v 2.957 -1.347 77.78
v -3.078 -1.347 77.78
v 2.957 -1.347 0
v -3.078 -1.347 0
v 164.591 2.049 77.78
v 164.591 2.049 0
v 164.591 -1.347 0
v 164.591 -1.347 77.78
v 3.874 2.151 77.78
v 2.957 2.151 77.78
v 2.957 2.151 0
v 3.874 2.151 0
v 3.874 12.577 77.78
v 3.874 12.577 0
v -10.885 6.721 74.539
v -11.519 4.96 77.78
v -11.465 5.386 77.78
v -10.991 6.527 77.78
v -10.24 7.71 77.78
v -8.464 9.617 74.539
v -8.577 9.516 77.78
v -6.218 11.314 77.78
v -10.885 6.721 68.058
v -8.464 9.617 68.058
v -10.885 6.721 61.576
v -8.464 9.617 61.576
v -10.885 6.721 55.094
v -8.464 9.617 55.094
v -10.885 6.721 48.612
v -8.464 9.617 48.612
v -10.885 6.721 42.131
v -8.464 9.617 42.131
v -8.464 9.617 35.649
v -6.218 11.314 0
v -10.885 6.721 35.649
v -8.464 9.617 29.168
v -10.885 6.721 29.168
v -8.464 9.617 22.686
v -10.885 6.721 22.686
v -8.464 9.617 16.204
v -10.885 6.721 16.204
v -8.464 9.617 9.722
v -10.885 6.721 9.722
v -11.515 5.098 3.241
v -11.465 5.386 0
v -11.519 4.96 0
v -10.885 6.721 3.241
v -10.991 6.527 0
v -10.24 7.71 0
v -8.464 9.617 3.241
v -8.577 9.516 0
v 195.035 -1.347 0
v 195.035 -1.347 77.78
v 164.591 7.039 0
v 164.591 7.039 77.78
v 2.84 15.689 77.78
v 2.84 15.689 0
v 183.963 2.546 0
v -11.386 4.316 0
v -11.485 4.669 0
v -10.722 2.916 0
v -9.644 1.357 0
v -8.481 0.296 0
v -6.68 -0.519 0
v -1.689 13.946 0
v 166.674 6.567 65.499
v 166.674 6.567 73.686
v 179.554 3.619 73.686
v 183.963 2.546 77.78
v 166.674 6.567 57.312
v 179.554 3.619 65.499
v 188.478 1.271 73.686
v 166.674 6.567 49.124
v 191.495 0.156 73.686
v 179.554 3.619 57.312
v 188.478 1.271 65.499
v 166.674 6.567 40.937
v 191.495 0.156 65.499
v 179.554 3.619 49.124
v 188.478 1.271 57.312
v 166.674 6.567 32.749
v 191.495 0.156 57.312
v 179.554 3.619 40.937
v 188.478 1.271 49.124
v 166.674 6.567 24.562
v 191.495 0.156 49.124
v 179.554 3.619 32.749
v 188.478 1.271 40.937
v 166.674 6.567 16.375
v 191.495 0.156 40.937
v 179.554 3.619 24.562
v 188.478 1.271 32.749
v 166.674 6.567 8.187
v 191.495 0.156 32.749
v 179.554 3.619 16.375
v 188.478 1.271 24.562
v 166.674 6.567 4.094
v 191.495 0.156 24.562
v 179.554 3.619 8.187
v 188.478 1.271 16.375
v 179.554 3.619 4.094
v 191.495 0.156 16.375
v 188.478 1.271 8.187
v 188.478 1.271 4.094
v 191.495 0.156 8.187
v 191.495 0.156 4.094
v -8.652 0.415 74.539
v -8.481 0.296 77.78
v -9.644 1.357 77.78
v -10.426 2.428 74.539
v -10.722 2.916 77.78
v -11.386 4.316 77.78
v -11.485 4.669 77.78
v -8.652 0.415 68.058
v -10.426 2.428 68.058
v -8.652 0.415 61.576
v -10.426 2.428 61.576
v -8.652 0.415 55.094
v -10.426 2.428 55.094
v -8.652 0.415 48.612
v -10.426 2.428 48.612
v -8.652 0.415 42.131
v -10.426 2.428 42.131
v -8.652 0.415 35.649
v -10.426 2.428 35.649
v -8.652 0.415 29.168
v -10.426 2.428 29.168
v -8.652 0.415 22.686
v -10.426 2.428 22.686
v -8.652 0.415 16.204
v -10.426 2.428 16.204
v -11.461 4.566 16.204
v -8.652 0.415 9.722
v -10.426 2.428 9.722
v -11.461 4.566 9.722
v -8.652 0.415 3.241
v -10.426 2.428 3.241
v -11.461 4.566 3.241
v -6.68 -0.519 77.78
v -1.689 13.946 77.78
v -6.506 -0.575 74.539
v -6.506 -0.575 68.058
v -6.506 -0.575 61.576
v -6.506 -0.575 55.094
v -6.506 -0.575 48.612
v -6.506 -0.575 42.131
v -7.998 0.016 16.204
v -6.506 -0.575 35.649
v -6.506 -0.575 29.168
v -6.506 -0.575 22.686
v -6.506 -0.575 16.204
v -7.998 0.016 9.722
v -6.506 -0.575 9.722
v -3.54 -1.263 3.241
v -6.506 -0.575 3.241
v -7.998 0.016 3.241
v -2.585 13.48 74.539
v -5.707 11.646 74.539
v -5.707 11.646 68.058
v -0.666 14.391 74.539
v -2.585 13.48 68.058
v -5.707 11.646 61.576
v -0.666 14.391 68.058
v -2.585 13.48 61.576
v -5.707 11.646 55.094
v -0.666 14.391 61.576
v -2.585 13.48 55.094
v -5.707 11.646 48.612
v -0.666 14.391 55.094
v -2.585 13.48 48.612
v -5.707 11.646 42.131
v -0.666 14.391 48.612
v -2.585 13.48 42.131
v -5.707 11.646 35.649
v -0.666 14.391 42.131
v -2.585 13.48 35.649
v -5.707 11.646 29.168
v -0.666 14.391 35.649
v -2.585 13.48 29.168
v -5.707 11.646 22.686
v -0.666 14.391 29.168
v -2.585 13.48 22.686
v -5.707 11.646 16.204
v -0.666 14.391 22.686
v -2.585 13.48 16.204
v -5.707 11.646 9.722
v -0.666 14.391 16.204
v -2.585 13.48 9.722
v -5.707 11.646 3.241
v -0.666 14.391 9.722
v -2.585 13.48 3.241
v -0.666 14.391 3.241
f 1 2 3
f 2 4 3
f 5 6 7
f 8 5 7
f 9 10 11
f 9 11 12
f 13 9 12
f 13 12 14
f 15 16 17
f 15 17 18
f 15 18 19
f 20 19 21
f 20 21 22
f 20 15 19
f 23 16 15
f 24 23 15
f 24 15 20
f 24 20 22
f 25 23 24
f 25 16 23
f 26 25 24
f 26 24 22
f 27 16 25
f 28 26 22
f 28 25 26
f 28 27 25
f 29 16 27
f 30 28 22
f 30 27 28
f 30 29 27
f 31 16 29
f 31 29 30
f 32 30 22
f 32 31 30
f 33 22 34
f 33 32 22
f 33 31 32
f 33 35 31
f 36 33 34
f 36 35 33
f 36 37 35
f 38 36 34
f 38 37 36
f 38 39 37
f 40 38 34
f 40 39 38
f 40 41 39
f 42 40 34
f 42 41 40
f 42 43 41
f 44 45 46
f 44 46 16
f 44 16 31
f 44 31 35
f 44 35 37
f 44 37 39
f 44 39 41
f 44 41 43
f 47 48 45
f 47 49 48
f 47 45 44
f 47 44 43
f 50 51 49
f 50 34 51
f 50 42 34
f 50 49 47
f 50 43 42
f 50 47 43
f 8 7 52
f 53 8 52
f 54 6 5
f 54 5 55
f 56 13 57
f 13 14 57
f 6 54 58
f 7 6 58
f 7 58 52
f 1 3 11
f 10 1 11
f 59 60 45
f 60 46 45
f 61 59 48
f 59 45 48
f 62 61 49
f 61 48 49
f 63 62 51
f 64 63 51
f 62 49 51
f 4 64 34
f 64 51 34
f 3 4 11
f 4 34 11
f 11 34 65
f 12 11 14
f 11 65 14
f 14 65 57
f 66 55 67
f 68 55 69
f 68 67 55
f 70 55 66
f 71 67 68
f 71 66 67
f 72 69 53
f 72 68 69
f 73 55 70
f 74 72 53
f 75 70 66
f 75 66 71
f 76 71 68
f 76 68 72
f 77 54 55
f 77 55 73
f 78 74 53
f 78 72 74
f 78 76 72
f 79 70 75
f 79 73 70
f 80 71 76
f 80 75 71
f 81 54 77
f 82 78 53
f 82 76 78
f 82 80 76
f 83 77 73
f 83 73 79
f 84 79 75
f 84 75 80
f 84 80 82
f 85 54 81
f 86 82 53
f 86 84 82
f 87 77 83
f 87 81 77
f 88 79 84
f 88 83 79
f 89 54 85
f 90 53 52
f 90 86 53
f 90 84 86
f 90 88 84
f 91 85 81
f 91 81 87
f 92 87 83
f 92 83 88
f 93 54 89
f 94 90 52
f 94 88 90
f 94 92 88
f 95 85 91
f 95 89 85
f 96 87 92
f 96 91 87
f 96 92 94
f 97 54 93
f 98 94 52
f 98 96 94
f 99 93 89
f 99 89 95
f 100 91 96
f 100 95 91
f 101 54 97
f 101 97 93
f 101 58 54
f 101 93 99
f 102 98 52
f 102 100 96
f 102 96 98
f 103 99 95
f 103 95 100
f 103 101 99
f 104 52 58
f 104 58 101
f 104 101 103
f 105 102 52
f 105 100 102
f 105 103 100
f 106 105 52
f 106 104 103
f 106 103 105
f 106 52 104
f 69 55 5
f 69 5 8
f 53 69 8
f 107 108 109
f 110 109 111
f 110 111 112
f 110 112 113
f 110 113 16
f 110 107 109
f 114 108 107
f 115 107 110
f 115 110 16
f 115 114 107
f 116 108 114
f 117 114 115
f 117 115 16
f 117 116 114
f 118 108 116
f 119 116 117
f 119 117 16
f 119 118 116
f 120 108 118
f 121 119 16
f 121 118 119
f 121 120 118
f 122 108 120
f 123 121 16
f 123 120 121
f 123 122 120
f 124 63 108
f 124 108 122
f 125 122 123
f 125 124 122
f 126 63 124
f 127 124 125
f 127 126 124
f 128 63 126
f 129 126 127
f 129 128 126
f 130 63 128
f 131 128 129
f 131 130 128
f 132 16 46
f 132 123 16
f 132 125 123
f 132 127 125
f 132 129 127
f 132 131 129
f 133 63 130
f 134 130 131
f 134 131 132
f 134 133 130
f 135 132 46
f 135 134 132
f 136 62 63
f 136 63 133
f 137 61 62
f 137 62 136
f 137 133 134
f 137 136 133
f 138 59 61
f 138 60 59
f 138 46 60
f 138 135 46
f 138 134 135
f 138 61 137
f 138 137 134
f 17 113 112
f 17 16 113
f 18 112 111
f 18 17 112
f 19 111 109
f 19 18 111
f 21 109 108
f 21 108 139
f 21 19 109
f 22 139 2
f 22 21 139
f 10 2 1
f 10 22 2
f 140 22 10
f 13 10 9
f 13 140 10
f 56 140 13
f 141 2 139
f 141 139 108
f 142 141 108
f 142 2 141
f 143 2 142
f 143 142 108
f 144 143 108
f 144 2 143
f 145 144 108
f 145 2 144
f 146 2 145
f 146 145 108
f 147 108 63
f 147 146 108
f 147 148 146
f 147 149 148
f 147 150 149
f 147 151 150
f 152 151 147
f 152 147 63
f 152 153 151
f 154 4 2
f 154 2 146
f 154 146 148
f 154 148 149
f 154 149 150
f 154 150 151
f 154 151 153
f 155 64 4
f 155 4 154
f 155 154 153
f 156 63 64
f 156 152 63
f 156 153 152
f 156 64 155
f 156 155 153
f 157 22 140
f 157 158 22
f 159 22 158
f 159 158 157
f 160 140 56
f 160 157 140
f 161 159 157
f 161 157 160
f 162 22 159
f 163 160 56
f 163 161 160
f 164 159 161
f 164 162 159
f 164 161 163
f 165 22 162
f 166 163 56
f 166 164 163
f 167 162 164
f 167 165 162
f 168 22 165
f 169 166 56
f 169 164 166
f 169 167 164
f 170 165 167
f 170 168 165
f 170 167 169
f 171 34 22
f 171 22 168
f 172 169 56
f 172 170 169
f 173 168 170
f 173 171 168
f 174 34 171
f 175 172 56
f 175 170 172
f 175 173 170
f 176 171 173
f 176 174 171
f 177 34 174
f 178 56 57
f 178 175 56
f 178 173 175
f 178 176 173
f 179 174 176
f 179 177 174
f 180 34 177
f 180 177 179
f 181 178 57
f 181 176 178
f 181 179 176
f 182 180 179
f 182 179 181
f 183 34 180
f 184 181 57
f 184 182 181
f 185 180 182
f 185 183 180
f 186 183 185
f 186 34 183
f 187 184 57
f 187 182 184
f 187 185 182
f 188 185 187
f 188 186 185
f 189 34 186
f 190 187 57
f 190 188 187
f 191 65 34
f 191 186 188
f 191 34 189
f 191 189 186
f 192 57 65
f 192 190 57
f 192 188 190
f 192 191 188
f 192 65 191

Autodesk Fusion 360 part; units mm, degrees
sketch "Sketch1" plane through (0, 0, 0) normal (0, 0, 1) x (1, 0, 0) in component "Airfoil structure"
  spline S0 degree 5 poles (152.7645, 9.7049) (152.9716, 9.6615) (153.4494, 9.5595) (154.3565, 9.3601) (155.9477, 9.0023) (158.563, 8.408) (161.765, 7.6797) (165.4684, 6.8398) (169.5125, 5.9246) (173.6689, 4.9817) (177.6907, 4.06) (181.3486, 3.2014) (184.473, 2.4316) (186.9959, 1.7512) (188.9984, 1.125) (190.7574, 0.4718) (192.2494, -0.1494) (193.5536, -0.7078) (194.5245, -1.1262) (195.0353, -1.3469) knots 0 0 0 0 0 0 0.066667 0.133333 0.2 0.266667 0.333333 0.4 0.466667 0.533333 0.6 0.666667 0.733333 0.8 0.866667 0.933333 1 1 1 1 1 1
  line L0 (151.6776, 9.9322) -> (153.8514, 9.4775)
  line L1 (191.9867, -0.0294) -> (198.0838, -2.6644)
  circle A0 centre (33.1388, 9.1296) radius 4.765
  circle A1 centre (116.1615, 7.0362) radius 3.175
  spline S1 degree 5 poles (-3.078, -1.3469) (-3.5988, -1.2541) (-4.5389, -1.0768) (-5.6443, -0.8357) (-6.5925, -0.5673) (-7.3281, -0.2956) (-8.0506, 0.0085) (-9.0186, 0.5701) (-10.0677, 1.7864) (-10.9637, 3.2509) (-11.5101, 4.486) (-11.5777, 5.0948) (-11.4072, 5.6425) (-11.0115, 6.6062) (-10.1312, 7.9923) (-8.6029, 9.6425) (-6.4042, 11.2716) (-4.197, 12.5713) (-2.7351, 13.406) (-1.8317, 13.8945) (-1.0217, 14.2663) (0.0954, 14.6934) (1.4589, 15.1916) (2.6392, 15.6172) (3.2971, 15.8534) knots 0 0 0 0 0 0 0.05 0.1 0.15 0.2 0.25 0.3 0.35 0.4 0.45 0.5 0.55 0.6 0.65 0.7 0.75 0.8 0.85 0.9 0.95 1 1 1 1 1 1
  line L2 (0.5733, -1.9976) -> (-6.7293, -0.6962)
  line L3 (-0.0118, 14.6656) -> (6.606, 17.0412)
  line L4 (-8.4792, 9.8153) -> (-3.9569, 12.8132)
  line L5 (-11.5034, 4.2257) -> (-11.5345, 5.6935)
  line L6 (-7.2174, -0.5359) -> (-9.7443, 1.1286)
  line L7 (19.5688, 19.3646) -> (90.5688, 19.3646)
  spline S2 degree 5 poles (93.5688, 19.3646) (93.8188, 19.3387) (94.2829, 19.2905) (94.8714, 19.229) (95.4658, 19.1659) (96.0263, 19.1049) (96.567, 19.0445) (97.2368, 18.9678) (98.1315, 18.8622) (99.313, 18.7173) (100.8214, 18.5245) (102.3118, 18.3263) (103.5973, 18.1504) (104.53, 18.0207) (105.0153, 17.9528) knots 0 0 0 0 0 0 0.1 0.2 0.3 0.4 0.5 0.6 0.7 0.8 0.9 1 1 1 1 1 1
  line L8 (92.266, 19.4996) -> (94.8715, 19.2297)
  line L9 (103.6448, 18.1447) -> (106.3858, 17.761)
  spline S3 degree 5 poles (6.5765, 16.943) (6.9079, 17.0449) (7.5374, 17.2364) (8.3817, 17.4868) (9.3156, 17.7508) (10.2084, 17.9865) (10.8922, 18.156) (11.4504, 18.29) (11.9864, 18.4184) (12.6265, 18.5675) (13.504, 18.76) (14.4962, 18.9637) (15.447, 19.1503) (16.1786, 19.2906) (16.5688, 19.3646) knots 0 0 0 0 0 0 0.1 0.2 0.3 0.4 0.5 0.6 0.7 0.8 0.9 1 1 1 1 1 1
  line L10 (5.4107, 16.5846) -> (7.7424, 17.3015)
  line L11 (15.2328, 19.111) -> (17.9048, 19.6183)
  line L12 (152.2841, 9.8053) -> (152.7645, 9.7049)
  line L13 (107.9851, 17.5282) -> (108.4359, 17.4637)
  line L14 (6.1441, 16.7993) -> (6.5765, 16.943)
  line L15 (128.8618, -1.3469) -> (132.3168, -1.3469)
  line L16 (149.3476, 10.4194) -> (148.7335, 7.483)
  line L17 (148.7335, 7.483) -> (151.67, 6.8689)
  line L18 (151.67, 6.8689) -> (152.2841, 9.8053)
  line L19 (3.2971, 15.8534) -> (4.243, 13.0064)
  line L20 (4.243, 13.0064) -> (7.09, 13.9524)
  line L21 (7.09, 13.9524) -> (6.1441, 16.7993)
  line L22 (161.1951, -1.3469) -> (161.1951, 1.6531)
  line L23 (161.1951, 1.6531) -> (164.1951, 1.6531)
  line L24 (164.1951, 1.6531) -> (164.1951, -1.3469)
  line L25 (132.3168, -1.3469) -> (161.1951, -1.3469)
  line L26 (164.1951, -1.3469) -> (195.0353, -1.3469)
  line L27 (3.4543, -1.3469) -> (3.4543, 1.6531)
  line L28 (3.4543, 1.6531) -> (6.4543, 1.6531)
  line L29 (6.4543, 1.6531) -> (6.4543, -1.3469)
  line L30 (-3.078, -1.3469) -> (3.4543, -1.3469)
  line L31 (6.4543, -1.3469) -> (128.8618, -1.3469)
  line L32 (105.0153, 17.9528) -> (107.9851, 17.5282)
  line L33 (19.5688, 19.3646) -> (19.5688, 16.3646)
  line L34 (19.5688, 16.3646) -> (16.5688, 16.3646)
  line L35 (16.5688, 16.3646) -> (16.5688, 19.3646)
  line L36 (90.5688, 19.3646) -> (90.5688, 16.3646)
  line L37 (90.5688, 16.3646) -> (93.5688, 16.3646)
  line L38 (93.5688, 16.3646) -> (93.5688, 19.3646)
  line L39 (113.7881, 13.5683) -> (110.8279, 14.0557)
  line L40 (110.8279, 14.0557) -> (111.3153, 17.0159)
  line L41 (113.7881, 13.5683) -> (114.2755, 16.5285)
  spline S4 degree 5 poles (108.4359, 17.4637) (108.5255, 17.4506) (108.6943, 17.4261) (108.916, 17.394) (109.1532, 17.3597) (109.3785, 17.3272) (109.5651, 17.2997) (109.7467, 17.2719) (109.9518, 17.2393) (110.199, 17.1992) (110.5008, 17.1497) (110.7926, 17.1018) (111.0419, 17.0608) (111.2219, 17.0312) (111.3153, 17.0159) knots 0 0 0 0 0 0 0.1 0.2 0.3 0.4 0.5 0.6 0.7 0.8 0.9 1 1 1 1 1 1
  line L42 (107.9387, 17.5361) -> (108.933, 17.3913)
  line L43 (110.8712, 17.0888) -> (111.7595, 16.9429)
  spline S5 degree 5 poles (114.2755, 16.5285) (114.908, 16.4243) (116.2157, 16.2103) (118.305, 15.8728) (121.3361, 15.3892) (125.4662, 14.728) (129.833, 14.0131) (134.2929, 13.2559) (138.6571, 12.4806) (142.6792, 11.7322) (146.0525, 11.0804) (147.9853, 10.6961) (148.8914, 10.5134) (149.2384, 10.4423) (149.3476, 10.4194) knots 0 0 0 0 0 0 0.1 0.2 0.3 0.4 0.5 0.6 0.7 0.8 0.9 1 1 1 1 1 1
  line L44 (111.4536, 16.9935) -> (117.0973, 16.0636)
  line L45 (148.6356, 10.5684) -> (150.0597, 10.2705)
  line L46 (151.67, 6.8689) -> (155.718, 6.0223) construction
  line L47 (164.1951, 1.6531) -> (164.6963, 1.6531) construction
  line L48 (152.6756, 9.7234) -> (152.0615, 6.787)
  line L49 (164.1951, 1.6531) -> (164.9867, 2.4447) construction
  line L50 (164.1951, 1.6531) -> (164.8816, 1.6531) construction
  line L51 (164.5909, 2.0489) -> (164.5909, -1.3469)
  line L52 (152.2841, 9.8053) -> (152.6756, 9.7234) construction
  line L53 (152.6756, 9.7234) -> (151.9827, 6.4137) construction
  line L54 (151.5912, 6.4957) -> (152.2841, 9.8053) construction
  line L55 (152.2841, 9.8053) -> (152.6756, 9.7234)
  line L56 (152.6756, 9.7234) -> (151.9342, 6.1818)
  line L57 (151.9342, 6.1818) -> (151.5427, 6.2638) construction
  line L58 (151.5427, 6.2638) -> (152.2841, 9.8053)
  line L59 (2.9567, -1.3469) -> (2.9567, 2.1507)
  line L60 (2.9567, 2.1507) -> (3.8737, 2.1507)
  line L61 (3.8737, 2.1507) -> (3.8737, 12.5773)
  line L62 (3.8737, 12.5773) -> (2.8398, 15.6891)
  line L63 (4.243, 13.0064) -> (1.9707, 12.2515) construction
  line L64 (3.4543, 1.6531) -> (2.143, 2.9644) construction
  line L65 (3.4543, 1.6531) -> (5.3087, 1.6531) construction
  line L66 (164.5909, 2.0489) -> (152.0615, 6.787)
  line L67 (151.67, 6.8689) -> (152.3309, 5.404) construction
  line L68 (151.5764, 6.4249) -> (164.1951, 1.6531)
  line L69 (164.5909, 2.0489) -> (164.5909, 7.0392)
  point P0 (-8.4808, 0.2964)
  point P1 (-11.5189, 4.9596)
  point P2 (-6.2181, 11.3142)
  point P3 (11.4183, 18.2822)
  point P4 (96.5722, 19.0435)
  point P5 (109.7229, 17.2753)
  point P6 (137.8507, 12.6179)
  point P7 (163.7235, 7.2358)
  point P8 (186.7896, 1.7868)
  dimension "d38" = 77
  dimension "d53" = 9.53
  dimension "d54" = 6.35
  dimension "d59" = 3
  dimension "d65" = 0.4
  dimension "d68" = 3
  dimension "d69" = 3
  dimension "d73" = 45
  dimension "d81" = 135
  dimension "d82" = 3
  dimension "d83" = 3
  dimension "d88" = 45
extrude "Extrude4" add sketch "Sketch1" along normal blind 77.78 contours S1 L30 L59 L60 L61 L62 makes body 1 in component "Airfoil structure"
extrude "Extrude3" add sketch "Sketch1" along normal blind 77.78 separate body contours S0 L26 L51 L69 makes body 2
extrude "Extrude3'" [suppressed] in component "Airfoil structure"
sketch "Sketch3" plane through (0, 0, 0) normal (0, 0, 1) x (1, 0, 0)
component "Airfoil structure" placed x (1, 0, 0) y (0, 1, 0) z (0, 0, 1) at (0, 0, 0)
